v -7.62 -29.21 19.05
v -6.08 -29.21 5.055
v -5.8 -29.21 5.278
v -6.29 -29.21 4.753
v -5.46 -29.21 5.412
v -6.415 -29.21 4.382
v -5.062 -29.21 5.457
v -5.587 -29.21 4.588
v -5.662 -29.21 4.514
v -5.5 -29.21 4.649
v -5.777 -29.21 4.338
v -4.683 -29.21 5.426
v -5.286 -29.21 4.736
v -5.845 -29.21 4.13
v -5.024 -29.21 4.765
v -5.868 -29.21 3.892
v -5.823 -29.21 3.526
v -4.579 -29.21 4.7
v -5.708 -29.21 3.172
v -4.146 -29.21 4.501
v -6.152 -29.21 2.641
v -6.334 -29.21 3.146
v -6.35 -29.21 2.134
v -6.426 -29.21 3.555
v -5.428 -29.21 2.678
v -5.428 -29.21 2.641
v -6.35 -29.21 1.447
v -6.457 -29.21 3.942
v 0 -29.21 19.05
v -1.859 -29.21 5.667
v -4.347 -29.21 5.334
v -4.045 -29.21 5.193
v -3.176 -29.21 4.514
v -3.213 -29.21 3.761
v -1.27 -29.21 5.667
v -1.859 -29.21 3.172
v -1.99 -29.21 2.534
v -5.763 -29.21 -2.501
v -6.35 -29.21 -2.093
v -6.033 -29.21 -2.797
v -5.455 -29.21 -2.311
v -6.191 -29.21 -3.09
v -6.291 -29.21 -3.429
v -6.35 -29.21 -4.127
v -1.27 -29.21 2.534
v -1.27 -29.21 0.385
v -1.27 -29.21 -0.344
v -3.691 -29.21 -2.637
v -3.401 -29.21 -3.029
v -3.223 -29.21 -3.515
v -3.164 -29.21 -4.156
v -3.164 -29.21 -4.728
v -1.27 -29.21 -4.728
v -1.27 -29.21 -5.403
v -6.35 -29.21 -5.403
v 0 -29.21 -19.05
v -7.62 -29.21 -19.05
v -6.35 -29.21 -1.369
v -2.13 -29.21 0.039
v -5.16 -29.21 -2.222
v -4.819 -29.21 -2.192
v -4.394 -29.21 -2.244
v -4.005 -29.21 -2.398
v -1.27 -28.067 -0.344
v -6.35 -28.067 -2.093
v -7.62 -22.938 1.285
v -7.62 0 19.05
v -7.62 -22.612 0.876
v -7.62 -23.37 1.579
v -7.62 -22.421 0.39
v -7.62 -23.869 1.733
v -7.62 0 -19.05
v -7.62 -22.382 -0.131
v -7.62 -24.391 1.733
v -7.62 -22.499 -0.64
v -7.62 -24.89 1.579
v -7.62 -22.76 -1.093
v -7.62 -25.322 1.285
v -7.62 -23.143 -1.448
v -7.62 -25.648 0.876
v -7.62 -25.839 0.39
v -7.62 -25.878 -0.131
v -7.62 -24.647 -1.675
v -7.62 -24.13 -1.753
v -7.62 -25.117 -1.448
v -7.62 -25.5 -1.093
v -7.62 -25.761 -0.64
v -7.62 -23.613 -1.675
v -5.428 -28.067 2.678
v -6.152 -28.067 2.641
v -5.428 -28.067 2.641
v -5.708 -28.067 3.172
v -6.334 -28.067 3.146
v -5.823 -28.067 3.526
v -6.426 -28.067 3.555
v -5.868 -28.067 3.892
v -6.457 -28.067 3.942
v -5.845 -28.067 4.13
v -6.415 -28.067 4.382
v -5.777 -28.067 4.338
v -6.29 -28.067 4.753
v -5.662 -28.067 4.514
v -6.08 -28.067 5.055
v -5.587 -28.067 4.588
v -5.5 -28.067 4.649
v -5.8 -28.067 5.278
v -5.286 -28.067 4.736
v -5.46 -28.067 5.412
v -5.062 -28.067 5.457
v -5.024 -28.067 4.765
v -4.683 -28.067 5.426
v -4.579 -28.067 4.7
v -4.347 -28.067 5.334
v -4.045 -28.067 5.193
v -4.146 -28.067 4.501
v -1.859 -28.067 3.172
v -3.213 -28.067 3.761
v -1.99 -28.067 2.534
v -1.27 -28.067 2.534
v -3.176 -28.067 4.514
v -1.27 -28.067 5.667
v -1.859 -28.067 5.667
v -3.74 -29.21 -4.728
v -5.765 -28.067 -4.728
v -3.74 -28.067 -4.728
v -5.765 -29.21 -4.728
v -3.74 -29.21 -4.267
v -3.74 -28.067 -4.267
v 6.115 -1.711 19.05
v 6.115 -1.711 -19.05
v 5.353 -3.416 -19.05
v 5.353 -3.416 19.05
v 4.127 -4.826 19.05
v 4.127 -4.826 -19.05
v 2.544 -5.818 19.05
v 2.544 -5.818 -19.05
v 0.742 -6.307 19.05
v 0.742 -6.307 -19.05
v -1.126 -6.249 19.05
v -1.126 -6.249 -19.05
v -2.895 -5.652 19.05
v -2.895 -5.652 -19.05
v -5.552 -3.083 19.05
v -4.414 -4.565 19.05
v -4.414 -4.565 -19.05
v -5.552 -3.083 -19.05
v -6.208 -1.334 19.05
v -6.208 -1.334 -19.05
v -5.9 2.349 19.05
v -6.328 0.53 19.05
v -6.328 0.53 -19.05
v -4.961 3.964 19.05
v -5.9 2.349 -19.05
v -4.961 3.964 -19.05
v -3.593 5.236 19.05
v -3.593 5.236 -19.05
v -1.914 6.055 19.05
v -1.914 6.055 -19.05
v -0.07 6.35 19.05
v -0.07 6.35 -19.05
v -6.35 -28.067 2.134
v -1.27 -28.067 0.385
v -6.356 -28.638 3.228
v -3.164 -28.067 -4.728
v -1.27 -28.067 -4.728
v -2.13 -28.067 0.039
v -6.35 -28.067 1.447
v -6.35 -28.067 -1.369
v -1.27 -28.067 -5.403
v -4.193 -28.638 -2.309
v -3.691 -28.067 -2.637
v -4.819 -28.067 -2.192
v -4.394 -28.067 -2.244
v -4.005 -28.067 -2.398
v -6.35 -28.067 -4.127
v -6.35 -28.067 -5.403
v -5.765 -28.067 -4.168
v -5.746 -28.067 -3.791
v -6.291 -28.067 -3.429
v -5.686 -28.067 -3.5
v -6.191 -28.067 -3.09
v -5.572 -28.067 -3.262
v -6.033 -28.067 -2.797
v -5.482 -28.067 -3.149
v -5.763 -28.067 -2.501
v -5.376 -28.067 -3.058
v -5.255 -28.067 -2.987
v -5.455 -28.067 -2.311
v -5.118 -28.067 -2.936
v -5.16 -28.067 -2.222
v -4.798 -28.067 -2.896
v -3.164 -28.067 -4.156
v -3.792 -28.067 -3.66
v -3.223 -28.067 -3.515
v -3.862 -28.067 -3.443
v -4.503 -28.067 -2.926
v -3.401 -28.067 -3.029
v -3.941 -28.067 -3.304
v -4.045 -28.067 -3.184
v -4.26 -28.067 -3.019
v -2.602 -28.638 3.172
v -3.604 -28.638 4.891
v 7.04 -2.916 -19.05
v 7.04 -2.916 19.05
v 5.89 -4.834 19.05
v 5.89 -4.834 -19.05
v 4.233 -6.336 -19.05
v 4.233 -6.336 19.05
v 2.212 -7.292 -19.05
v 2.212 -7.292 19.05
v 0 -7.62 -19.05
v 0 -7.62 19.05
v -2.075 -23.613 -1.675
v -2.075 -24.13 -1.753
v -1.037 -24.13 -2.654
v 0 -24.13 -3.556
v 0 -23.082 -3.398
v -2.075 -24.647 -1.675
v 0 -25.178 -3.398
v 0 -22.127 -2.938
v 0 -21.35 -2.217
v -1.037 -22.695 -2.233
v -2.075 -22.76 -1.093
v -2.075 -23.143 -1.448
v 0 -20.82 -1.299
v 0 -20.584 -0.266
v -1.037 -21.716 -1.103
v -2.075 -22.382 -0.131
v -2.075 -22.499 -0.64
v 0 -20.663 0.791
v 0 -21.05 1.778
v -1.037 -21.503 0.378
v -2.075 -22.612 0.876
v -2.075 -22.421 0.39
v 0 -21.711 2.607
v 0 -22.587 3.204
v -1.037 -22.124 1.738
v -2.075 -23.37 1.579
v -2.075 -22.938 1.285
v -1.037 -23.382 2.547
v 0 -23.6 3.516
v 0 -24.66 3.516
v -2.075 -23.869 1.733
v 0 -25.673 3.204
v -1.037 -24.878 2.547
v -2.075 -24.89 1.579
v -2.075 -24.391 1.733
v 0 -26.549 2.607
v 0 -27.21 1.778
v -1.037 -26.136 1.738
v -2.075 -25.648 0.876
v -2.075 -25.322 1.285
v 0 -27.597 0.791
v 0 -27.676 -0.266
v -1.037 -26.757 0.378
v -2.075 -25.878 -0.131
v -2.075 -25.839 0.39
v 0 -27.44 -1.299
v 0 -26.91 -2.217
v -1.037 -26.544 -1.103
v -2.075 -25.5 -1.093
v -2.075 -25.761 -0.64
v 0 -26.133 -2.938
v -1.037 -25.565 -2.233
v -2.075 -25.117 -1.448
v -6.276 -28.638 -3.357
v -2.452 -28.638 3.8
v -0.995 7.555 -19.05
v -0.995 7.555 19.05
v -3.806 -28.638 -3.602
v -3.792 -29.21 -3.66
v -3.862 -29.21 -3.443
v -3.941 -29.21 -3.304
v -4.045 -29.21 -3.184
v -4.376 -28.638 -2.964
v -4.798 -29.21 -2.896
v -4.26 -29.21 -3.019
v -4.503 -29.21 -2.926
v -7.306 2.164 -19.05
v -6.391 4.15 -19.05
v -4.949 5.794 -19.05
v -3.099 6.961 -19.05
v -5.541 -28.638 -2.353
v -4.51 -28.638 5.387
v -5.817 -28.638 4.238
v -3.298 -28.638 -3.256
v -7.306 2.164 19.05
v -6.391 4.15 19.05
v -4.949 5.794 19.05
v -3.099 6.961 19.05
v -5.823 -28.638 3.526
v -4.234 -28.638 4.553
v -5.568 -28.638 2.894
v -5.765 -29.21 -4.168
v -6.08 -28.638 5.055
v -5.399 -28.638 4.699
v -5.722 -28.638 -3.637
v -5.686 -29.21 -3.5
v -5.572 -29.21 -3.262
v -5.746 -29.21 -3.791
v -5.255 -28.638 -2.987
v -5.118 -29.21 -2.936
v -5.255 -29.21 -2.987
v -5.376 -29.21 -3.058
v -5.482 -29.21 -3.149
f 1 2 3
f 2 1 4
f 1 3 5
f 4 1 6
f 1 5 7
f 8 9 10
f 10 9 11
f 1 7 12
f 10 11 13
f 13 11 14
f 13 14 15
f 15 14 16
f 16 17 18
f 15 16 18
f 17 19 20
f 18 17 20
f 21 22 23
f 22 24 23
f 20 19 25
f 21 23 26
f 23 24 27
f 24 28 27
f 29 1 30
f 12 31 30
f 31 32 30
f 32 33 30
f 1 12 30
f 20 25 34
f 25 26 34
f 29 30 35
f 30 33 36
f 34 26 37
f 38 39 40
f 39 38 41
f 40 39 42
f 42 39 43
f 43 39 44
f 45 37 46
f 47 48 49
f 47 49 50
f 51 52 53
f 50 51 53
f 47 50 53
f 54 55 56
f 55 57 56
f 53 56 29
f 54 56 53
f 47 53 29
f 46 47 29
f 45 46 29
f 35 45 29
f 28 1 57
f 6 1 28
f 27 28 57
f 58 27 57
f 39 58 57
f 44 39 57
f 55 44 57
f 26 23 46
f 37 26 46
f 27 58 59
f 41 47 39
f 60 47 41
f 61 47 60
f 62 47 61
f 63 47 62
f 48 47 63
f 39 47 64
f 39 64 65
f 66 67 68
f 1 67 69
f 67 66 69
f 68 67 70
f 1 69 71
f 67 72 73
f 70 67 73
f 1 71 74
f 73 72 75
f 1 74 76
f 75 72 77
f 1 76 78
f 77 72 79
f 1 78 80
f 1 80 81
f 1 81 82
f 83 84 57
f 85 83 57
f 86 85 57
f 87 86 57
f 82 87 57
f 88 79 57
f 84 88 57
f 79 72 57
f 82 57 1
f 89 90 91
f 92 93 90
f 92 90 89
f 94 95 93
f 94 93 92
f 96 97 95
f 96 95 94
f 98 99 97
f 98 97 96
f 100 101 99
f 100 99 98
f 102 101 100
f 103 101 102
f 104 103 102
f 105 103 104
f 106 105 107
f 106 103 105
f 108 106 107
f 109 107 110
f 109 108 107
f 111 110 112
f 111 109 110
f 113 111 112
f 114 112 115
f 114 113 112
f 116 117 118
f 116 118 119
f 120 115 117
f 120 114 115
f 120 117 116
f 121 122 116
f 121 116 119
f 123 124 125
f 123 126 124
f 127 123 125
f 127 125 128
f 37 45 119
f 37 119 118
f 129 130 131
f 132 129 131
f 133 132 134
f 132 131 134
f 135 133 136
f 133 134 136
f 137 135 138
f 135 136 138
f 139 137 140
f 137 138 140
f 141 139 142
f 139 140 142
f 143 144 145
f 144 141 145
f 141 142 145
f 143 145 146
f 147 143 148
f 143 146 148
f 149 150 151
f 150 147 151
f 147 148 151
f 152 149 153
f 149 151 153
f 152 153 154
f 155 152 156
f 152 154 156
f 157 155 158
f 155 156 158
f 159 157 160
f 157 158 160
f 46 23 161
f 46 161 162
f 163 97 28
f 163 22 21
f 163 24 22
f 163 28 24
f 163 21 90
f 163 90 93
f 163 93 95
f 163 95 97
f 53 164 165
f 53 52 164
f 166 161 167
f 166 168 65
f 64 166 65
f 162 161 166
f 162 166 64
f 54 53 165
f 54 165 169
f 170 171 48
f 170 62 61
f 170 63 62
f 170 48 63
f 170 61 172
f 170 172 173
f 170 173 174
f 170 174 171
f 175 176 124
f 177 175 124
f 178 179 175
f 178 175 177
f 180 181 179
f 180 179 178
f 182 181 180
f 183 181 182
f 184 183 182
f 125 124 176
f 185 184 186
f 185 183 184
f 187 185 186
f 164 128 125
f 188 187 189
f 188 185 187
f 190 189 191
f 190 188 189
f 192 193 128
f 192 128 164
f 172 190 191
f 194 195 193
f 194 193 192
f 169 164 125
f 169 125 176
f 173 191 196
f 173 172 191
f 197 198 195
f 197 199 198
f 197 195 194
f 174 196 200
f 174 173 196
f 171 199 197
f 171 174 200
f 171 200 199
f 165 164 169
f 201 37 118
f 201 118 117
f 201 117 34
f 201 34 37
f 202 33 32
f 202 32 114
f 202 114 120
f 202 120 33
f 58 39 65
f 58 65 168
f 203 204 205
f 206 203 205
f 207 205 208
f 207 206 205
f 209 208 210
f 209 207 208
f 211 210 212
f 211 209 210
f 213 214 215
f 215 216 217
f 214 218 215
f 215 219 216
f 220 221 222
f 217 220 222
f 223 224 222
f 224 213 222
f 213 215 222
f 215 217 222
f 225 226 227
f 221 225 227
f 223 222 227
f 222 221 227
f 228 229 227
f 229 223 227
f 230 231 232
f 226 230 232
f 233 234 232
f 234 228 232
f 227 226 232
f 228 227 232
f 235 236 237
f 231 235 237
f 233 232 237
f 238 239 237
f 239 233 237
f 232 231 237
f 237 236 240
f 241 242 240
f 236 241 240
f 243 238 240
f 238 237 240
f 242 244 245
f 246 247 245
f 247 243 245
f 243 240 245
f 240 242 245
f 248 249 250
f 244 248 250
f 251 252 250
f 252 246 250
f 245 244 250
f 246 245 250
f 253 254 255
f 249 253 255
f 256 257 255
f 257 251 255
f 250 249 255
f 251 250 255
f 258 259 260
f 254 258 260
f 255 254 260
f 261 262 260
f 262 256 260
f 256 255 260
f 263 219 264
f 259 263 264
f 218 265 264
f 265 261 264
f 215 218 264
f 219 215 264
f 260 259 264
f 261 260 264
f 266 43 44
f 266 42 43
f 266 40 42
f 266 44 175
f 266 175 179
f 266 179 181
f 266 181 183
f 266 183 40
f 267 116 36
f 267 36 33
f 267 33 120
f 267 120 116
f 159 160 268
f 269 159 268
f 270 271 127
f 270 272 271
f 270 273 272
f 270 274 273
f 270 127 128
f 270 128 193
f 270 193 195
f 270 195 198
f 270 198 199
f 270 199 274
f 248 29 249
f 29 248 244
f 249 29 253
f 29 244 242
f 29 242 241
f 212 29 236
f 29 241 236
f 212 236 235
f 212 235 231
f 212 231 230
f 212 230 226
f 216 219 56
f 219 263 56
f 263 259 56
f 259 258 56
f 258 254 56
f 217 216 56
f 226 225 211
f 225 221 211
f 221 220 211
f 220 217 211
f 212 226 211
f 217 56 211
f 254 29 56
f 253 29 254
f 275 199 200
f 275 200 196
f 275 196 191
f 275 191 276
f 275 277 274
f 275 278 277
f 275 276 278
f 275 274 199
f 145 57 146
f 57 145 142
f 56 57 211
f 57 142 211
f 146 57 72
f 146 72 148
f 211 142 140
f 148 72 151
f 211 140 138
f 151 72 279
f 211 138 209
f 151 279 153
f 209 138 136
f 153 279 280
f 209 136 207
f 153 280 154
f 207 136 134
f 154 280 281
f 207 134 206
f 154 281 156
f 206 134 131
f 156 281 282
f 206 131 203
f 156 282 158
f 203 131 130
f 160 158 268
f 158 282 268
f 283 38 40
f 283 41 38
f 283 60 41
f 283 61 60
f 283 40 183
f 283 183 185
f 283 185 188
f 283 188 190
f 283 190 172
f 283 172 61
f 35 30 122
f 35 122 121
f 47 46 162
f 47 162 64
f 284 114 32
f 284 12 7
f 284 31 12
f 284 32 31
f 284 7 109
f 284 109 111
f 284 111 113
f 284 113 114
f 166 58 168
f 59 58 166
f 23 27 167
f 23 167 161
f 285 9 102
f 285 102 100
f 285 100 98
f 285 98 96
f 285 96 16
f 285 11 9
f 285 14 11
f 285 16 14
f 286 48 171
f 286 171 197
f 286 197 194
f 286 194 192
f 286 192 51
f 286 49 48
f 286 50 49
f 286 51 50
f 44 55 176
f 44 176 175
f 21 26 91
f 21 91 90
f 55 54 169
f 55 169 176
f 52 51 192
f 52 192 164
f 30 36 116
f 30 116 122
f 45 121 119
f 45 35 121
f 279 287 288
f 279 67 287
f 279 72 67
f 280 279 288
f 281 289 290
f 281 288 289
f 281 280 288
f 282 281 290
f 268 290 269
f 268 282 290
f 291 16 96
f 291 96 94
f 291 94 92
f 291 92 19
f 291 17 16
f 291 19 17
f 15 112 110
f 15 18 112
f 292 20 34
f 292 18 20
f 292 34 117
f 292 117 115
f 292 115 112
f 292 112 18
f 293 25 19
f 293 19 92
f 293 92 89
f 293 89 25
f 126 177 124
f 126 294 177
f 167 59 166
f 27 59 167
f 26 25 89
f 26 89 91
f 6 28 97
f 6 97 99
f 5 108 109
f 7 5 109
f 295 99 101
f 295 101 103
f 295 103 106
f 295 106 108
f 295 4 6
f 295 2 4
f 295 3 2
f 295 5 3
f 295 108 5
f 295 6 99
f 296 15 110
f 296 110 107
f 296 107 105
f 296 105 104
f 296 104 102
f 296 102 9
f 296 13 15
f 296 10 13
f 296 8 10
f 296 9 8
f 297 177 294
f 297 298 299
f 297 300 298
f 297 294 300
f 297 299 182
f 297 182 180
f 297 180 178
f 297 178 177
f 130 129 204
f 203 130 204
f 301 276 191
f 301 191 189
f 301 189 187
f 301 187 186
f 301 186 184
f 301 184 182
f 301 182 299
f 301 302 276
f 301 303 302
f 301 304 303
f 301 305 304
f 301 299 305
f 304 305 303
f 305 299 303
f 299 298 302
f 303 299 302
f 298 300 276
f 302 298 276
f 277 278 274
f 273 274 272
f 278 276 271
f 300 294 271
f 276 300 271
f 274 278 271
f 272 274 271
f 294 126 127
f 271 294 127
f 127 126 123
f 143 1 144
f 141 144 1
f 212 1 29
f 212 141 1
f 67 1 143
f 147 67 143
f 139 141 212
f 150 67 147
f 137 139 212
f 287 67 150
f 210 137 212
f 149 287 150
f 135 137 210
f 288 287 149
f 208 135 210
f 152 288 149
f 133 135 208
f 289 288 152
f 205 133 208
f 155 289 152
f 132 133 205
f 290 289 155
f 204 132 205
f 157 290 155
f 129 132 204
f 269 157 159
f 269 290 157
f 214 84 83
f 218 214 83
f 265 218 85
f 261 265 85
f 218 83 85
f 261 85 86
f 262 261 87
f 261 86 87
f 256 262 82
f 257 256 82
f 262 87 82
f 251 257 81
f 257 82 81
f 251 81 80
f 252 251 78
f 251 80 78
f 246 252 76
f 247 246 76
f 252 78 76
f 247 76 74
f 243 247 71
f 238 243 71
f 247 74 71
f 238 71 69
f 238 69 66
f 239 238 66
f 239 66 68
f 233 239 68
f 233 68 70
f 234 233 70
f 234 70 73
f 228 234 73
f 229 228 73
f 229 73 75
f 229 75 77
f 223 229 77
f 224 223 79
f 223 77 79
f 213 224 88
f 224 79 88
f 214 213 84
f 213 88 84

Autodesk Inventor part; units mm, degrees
ref_plane "YZ Plane" through (0, 0, 0) normal (1, 0, 0) x (0, 1, 0)
ref_plane "XZ Plane" through (0, 0, 0) normal (0, 1, 0) x (-1, 0, 0)
ref_plane "XY Plane" through (0, 0, 0) normal (0, 0, 1) x (1, 0, 0)
sketch "Sketch4" plane through (0, 0, 0) normal (0, 0, 1) x (1, 0, 0)
  arc A0 (-0.0698, 6.3496) -> (6.1152, -1.7109) centre (0, 0) ccw
  arc A1 (-0.9946, 7.5548) -> (7.04, -2.916) centre (0, 0) ccw
  line L0 (0, 0) -> (0, 7.9375) construction
  line L1 (-0.0698, 6.3496) -> (6.1152, -1.7109) construction
  line L2 (-0.0698, 6.3496) -> (-0.9946, 7.5548)
  line L3 (6.1152, -1.7109) -> (7.04, -2.916)
  circle A2 centre (0, 0) radius 6.35
  dimension "d10" = 12.7
  dimension "d11" = 1.27
  dimension "d12" = 37.5
  dimension "d13" = 10.16
extrude "Extrusion3" add sketch "Sketch4" along normal mid plane 38.1 contours A0 L3 A1 L2
sketch "Sketch5" plane through (0, 0, 0) normal (0, 0, 1) x (1, 0, 0)
  arc A0 (-0.9946, 7.5548) -> (7.04, -2.916) centre (0, 0) ccw projected
  line L0 (-7.62, 0) -> (-7.62, -29.21)
  line L1 (-7.62, -29.21) -> (0, -29.21)
  line L2 (0, -29.21) -> (0, -7.62)
  circle A1 centre (0, 0) radius 7.9375
  dimension "d16" = 21.59
extrude "Extrusion4" add sketch "Sketch5" along normal mid plane 38.1 contours A0 L2 A1 L0 | A1 L2 L1 L0 picked at (-7.3048, -2.4081)
sketch "Sketch6" plane through (0, -29.21, 19.05) normal (1, 0, 0) x (0, 0, -1)
  line L0 (0, 21.59) -> (38.1, 21.59) projected
  line L1 (38.1, 21.59) -> (38.1, 0) projected
  line L2 (0, 0) -> (38.1, 0) projected
  line L3 (0, 0) -> (0, 21.59) projected
  line L4 (19.05, 0) -> (19.05, 21.59) construction
  point P0 (19.05, 29.21)
  point P1 (19.05, 5.08)
  dimension "d30" = 5.08
  dimension "d31" = 0
hole "Hole1" at (0, -24.13, 0) direction (-1, 0, 0) diameter 3.5052 end through all countersink diameter 7.112 countersink angle 82
sketch "Sketch10" plane through (-7.62, -29.21, 19.05) normal (0, -1, 0) x (1, 0, 0)
  line L0 (0, -38.1) -> (0, 0) projected
  line L1 (7.62, -38.1) -> (0, -38.1) projected
  line L2 (7.62, 0) -> (7.62, -38.1) projected
  line L3 (0, 0) -> (7.62, 0) projected
  line L4 (3.81, -38.1) -> (3.81, 0) construction
  spline S0 degree 2 poles (2.8014, -21.2421) (3.1307, -21.2421) (3.7235, -21.4768) (3.9294, -21.6867) knots 0 0 0 1 2 2 2
  spline S1 degree 2 poles (3.9294, -21.6867) (4.1887, -21.9502) (4.4563, -22.6624) (4.4563, -23.2058) knots 0 0 0 1 2 2 2
  line L5 (4.4563, -23.2058) -> (4.4563, -23.778)
  line L6 (4.4563, -23.778) -> (6.35, -23.778)
  line L7 (6.35, -23.778) -> (6.35, -24.4532)
  line L8 (6.35, -24.4532) -> (1.27, -24.4532)
  line L9 (1.27, -24.4532) -> (1.27, -23.177)
  spline S2 degree 2 poles (1.27, -23.177) (1.27, -22.7241) (1.4182, -22.0902) (1.587, -21.8473) knots 0 0 0 1 2 2 2
  spline S3 degree 2 poles (1.587, -21.8473) (1.7805, -21.5632) (2.3774, -21.2421) (2.8014, -21.2421) knots 0 0 0 1 2 2 2
  spline S4 degree 2 poles (2.822, -21.9461) (2.5585, -21.9461) (2.1716, -22.1272) (2.0481, -22.3125) knots 0 0 0 1 2 2 2
  spline S5 degree 2 poles (2.0481, -22.3125) (1.941, -22.473) (1.8546, -22.9012) (1.8546, -23.2182) knots 0 0 0 1 2 2 2
  line L10 (1.8546, -23.2182) -> (1.8546, -23.778)
  line L11 (1.8546, -23.778) -> (3.88, -23.778)
  line L12 (3.88, -23.778) -> (3.88, -23.317)
  spline S6 degree 2 poles (3.88, -23.317) (3.88, -22.9053) (3.7482, -22.3989) (3.5753, -22.2343) knots 0 0 0 1 2 2 2
  spline S7 degree 2 poles (3.5753, -22.2343) (3.423, -22.0819) (3.0649, -21.9461) (2.822, -21.9461) knots 0 0 0 1 2 2 2
  line L13 (1.27, -16.9155) -> (6.35, -18.6651)
  line L14 (6.35, -18.6651) -> (6.35, -19.3937)
  line L15 (6.35, -19.3937) -> (1.27, -21.1433)
  line L16 (1.27, -21.1433) -> (1.27, -20.4188)
  line L17 (1.27, -20.4188) -> (5.4896, -19.0109)
  line L18 (5.4896, -19.0109) -> (1.27, -17.603)
  line L19 (1.27, -17.603) -> (1.27, -16.9155)
  line L20 (6.35, -13.3834) -> (6.35, -16.5162)
  line L21 (6.35, -16.5162) -> (5.6296, -16.5162)
  spline S8 degree 2 poles (5.6296, -16.5162) (5.3126, -16.1786) (4.7239, -15.5776) (4.4069, -15.2894) knots 0 0 0 1 2 2 2
  spline S9 degree 2 poles (4.4069, -15.2894) (3.7688, -14.7089) (3.0031, -14.2849) (2.5956, -14.2849) knots 0 0 0 1 2 2 2
  spline S10 degree 2 poles (2.5956, -14.2849) (2.3815, -14.2849) (2.0604, -14.4167) (1.9575, -14.536) knots 0 0 0 1 2 2 2
  spline S11 degree 2 poles (1.9575, -14.536) (1.8546, -14.6554) (1.7517, -14.9683) (1.7517, -15.1577) knots 0 0 0 1 2 2 2
  spline S12 degree 2 poles (1.7517, -15.1577) (1.7517, -15.3388) (1.8422, -15.7093) (1.9122, -15.8781) knots 0 0 0 1 2 2 2
  spline S13 degree 2 poles (1.9122, -15.8781) (1.9698, -16.0222) (2.1345, -16.2898) (2.1921, -16.3721) knots 0 0 0 1 2 2 2
  line L22 (2.1921, -16.3721) -> (2.1921, -16.4091)
  line L23 (2.1921, -16.4091) -> (1.4676, -16.4091)
  spline S14 degree 2 poles (1.4676, -16.4091) (1.3647, -16.1992) (1.163, -15.4458) (1.163, -15.1083) knots 0 0 0 1 2 2 2
  spline S15 degree 2 poles (1.163, -15.1083) (1.163, -14.3961) (1.9163, -13.5933) (2.5585, -13.5933) knots 0 0 0 1 2 2 2
  spline S16 degree 2 poles (2.5585, -13.5933) (2.859, -13.5933) (3.3613, -13.7333) (3.5753, -13.8568) knots 0 0 0 1 2 2 2
  spline S17 degree 2 poles (3.5753, -13.8568) (3.7976, -13.9803) (4.234, -14.3384) (4.444, -14.536) knots 0 0 0 1 2 2 2
  spline S18 degree 2 poles (4.444, -14.536) (4.7939, -14.8571) (5.5431, -15.6434) (5.7613, -15.8781) knots 0 0 0 1 2 2 2
  line L24 (5.7613, -15.8781) -> (5.7613, -13.3834)
  line L25 (5.7613, -13.3834) -> (6.35, -13.3834)
  point P0 (7.62, -19.05)
extrude "Text" cut sketch "Sketch10" against normal blind 1.143 contours S0 S1 L5 L6 L7 L8 L9 S2 S3 | L13 L14 L15 L16 L17 L18 L19 | L20 L21 S8 S9 S10 S11 S12 S13 L22 L23 S14 S15 S16 S17 S18 L24 L25
equation "\"d10\" = shadeDiameter"
equation "\"d11\" = shadeHolderWallThickness"
equation "\"d13\" = openingForShade"
equation "\"d14\" = partWidth"
equation "\"d16\" = flatBelowShade"
equation "\"d17\" = partWidth"
equation "\"d30\" = holeHeightAboveBottom"
equation "\"d28\" = textDepth"
equation "\"shadeDiameter\" = 12.7"
equation "\"partWidth\" = 38.1"
equation "\"backThickness\" = 1.905"
equation "\"backHeight\" = 25.4"
equation "\"cutTiltAngle\" = 52.5deg"
equation "\"flatBelowShade\" = 21.59"
equation "\"shadeHolderWallThickness\" = 1.27"
equation "\"openingForShade\" = 10.16"
equation "\"textDepth\" = 1.143"
equation "\"holeHeightAboveBottom\" = 5.08"
properties part number "shadeHolderSideWindow"
